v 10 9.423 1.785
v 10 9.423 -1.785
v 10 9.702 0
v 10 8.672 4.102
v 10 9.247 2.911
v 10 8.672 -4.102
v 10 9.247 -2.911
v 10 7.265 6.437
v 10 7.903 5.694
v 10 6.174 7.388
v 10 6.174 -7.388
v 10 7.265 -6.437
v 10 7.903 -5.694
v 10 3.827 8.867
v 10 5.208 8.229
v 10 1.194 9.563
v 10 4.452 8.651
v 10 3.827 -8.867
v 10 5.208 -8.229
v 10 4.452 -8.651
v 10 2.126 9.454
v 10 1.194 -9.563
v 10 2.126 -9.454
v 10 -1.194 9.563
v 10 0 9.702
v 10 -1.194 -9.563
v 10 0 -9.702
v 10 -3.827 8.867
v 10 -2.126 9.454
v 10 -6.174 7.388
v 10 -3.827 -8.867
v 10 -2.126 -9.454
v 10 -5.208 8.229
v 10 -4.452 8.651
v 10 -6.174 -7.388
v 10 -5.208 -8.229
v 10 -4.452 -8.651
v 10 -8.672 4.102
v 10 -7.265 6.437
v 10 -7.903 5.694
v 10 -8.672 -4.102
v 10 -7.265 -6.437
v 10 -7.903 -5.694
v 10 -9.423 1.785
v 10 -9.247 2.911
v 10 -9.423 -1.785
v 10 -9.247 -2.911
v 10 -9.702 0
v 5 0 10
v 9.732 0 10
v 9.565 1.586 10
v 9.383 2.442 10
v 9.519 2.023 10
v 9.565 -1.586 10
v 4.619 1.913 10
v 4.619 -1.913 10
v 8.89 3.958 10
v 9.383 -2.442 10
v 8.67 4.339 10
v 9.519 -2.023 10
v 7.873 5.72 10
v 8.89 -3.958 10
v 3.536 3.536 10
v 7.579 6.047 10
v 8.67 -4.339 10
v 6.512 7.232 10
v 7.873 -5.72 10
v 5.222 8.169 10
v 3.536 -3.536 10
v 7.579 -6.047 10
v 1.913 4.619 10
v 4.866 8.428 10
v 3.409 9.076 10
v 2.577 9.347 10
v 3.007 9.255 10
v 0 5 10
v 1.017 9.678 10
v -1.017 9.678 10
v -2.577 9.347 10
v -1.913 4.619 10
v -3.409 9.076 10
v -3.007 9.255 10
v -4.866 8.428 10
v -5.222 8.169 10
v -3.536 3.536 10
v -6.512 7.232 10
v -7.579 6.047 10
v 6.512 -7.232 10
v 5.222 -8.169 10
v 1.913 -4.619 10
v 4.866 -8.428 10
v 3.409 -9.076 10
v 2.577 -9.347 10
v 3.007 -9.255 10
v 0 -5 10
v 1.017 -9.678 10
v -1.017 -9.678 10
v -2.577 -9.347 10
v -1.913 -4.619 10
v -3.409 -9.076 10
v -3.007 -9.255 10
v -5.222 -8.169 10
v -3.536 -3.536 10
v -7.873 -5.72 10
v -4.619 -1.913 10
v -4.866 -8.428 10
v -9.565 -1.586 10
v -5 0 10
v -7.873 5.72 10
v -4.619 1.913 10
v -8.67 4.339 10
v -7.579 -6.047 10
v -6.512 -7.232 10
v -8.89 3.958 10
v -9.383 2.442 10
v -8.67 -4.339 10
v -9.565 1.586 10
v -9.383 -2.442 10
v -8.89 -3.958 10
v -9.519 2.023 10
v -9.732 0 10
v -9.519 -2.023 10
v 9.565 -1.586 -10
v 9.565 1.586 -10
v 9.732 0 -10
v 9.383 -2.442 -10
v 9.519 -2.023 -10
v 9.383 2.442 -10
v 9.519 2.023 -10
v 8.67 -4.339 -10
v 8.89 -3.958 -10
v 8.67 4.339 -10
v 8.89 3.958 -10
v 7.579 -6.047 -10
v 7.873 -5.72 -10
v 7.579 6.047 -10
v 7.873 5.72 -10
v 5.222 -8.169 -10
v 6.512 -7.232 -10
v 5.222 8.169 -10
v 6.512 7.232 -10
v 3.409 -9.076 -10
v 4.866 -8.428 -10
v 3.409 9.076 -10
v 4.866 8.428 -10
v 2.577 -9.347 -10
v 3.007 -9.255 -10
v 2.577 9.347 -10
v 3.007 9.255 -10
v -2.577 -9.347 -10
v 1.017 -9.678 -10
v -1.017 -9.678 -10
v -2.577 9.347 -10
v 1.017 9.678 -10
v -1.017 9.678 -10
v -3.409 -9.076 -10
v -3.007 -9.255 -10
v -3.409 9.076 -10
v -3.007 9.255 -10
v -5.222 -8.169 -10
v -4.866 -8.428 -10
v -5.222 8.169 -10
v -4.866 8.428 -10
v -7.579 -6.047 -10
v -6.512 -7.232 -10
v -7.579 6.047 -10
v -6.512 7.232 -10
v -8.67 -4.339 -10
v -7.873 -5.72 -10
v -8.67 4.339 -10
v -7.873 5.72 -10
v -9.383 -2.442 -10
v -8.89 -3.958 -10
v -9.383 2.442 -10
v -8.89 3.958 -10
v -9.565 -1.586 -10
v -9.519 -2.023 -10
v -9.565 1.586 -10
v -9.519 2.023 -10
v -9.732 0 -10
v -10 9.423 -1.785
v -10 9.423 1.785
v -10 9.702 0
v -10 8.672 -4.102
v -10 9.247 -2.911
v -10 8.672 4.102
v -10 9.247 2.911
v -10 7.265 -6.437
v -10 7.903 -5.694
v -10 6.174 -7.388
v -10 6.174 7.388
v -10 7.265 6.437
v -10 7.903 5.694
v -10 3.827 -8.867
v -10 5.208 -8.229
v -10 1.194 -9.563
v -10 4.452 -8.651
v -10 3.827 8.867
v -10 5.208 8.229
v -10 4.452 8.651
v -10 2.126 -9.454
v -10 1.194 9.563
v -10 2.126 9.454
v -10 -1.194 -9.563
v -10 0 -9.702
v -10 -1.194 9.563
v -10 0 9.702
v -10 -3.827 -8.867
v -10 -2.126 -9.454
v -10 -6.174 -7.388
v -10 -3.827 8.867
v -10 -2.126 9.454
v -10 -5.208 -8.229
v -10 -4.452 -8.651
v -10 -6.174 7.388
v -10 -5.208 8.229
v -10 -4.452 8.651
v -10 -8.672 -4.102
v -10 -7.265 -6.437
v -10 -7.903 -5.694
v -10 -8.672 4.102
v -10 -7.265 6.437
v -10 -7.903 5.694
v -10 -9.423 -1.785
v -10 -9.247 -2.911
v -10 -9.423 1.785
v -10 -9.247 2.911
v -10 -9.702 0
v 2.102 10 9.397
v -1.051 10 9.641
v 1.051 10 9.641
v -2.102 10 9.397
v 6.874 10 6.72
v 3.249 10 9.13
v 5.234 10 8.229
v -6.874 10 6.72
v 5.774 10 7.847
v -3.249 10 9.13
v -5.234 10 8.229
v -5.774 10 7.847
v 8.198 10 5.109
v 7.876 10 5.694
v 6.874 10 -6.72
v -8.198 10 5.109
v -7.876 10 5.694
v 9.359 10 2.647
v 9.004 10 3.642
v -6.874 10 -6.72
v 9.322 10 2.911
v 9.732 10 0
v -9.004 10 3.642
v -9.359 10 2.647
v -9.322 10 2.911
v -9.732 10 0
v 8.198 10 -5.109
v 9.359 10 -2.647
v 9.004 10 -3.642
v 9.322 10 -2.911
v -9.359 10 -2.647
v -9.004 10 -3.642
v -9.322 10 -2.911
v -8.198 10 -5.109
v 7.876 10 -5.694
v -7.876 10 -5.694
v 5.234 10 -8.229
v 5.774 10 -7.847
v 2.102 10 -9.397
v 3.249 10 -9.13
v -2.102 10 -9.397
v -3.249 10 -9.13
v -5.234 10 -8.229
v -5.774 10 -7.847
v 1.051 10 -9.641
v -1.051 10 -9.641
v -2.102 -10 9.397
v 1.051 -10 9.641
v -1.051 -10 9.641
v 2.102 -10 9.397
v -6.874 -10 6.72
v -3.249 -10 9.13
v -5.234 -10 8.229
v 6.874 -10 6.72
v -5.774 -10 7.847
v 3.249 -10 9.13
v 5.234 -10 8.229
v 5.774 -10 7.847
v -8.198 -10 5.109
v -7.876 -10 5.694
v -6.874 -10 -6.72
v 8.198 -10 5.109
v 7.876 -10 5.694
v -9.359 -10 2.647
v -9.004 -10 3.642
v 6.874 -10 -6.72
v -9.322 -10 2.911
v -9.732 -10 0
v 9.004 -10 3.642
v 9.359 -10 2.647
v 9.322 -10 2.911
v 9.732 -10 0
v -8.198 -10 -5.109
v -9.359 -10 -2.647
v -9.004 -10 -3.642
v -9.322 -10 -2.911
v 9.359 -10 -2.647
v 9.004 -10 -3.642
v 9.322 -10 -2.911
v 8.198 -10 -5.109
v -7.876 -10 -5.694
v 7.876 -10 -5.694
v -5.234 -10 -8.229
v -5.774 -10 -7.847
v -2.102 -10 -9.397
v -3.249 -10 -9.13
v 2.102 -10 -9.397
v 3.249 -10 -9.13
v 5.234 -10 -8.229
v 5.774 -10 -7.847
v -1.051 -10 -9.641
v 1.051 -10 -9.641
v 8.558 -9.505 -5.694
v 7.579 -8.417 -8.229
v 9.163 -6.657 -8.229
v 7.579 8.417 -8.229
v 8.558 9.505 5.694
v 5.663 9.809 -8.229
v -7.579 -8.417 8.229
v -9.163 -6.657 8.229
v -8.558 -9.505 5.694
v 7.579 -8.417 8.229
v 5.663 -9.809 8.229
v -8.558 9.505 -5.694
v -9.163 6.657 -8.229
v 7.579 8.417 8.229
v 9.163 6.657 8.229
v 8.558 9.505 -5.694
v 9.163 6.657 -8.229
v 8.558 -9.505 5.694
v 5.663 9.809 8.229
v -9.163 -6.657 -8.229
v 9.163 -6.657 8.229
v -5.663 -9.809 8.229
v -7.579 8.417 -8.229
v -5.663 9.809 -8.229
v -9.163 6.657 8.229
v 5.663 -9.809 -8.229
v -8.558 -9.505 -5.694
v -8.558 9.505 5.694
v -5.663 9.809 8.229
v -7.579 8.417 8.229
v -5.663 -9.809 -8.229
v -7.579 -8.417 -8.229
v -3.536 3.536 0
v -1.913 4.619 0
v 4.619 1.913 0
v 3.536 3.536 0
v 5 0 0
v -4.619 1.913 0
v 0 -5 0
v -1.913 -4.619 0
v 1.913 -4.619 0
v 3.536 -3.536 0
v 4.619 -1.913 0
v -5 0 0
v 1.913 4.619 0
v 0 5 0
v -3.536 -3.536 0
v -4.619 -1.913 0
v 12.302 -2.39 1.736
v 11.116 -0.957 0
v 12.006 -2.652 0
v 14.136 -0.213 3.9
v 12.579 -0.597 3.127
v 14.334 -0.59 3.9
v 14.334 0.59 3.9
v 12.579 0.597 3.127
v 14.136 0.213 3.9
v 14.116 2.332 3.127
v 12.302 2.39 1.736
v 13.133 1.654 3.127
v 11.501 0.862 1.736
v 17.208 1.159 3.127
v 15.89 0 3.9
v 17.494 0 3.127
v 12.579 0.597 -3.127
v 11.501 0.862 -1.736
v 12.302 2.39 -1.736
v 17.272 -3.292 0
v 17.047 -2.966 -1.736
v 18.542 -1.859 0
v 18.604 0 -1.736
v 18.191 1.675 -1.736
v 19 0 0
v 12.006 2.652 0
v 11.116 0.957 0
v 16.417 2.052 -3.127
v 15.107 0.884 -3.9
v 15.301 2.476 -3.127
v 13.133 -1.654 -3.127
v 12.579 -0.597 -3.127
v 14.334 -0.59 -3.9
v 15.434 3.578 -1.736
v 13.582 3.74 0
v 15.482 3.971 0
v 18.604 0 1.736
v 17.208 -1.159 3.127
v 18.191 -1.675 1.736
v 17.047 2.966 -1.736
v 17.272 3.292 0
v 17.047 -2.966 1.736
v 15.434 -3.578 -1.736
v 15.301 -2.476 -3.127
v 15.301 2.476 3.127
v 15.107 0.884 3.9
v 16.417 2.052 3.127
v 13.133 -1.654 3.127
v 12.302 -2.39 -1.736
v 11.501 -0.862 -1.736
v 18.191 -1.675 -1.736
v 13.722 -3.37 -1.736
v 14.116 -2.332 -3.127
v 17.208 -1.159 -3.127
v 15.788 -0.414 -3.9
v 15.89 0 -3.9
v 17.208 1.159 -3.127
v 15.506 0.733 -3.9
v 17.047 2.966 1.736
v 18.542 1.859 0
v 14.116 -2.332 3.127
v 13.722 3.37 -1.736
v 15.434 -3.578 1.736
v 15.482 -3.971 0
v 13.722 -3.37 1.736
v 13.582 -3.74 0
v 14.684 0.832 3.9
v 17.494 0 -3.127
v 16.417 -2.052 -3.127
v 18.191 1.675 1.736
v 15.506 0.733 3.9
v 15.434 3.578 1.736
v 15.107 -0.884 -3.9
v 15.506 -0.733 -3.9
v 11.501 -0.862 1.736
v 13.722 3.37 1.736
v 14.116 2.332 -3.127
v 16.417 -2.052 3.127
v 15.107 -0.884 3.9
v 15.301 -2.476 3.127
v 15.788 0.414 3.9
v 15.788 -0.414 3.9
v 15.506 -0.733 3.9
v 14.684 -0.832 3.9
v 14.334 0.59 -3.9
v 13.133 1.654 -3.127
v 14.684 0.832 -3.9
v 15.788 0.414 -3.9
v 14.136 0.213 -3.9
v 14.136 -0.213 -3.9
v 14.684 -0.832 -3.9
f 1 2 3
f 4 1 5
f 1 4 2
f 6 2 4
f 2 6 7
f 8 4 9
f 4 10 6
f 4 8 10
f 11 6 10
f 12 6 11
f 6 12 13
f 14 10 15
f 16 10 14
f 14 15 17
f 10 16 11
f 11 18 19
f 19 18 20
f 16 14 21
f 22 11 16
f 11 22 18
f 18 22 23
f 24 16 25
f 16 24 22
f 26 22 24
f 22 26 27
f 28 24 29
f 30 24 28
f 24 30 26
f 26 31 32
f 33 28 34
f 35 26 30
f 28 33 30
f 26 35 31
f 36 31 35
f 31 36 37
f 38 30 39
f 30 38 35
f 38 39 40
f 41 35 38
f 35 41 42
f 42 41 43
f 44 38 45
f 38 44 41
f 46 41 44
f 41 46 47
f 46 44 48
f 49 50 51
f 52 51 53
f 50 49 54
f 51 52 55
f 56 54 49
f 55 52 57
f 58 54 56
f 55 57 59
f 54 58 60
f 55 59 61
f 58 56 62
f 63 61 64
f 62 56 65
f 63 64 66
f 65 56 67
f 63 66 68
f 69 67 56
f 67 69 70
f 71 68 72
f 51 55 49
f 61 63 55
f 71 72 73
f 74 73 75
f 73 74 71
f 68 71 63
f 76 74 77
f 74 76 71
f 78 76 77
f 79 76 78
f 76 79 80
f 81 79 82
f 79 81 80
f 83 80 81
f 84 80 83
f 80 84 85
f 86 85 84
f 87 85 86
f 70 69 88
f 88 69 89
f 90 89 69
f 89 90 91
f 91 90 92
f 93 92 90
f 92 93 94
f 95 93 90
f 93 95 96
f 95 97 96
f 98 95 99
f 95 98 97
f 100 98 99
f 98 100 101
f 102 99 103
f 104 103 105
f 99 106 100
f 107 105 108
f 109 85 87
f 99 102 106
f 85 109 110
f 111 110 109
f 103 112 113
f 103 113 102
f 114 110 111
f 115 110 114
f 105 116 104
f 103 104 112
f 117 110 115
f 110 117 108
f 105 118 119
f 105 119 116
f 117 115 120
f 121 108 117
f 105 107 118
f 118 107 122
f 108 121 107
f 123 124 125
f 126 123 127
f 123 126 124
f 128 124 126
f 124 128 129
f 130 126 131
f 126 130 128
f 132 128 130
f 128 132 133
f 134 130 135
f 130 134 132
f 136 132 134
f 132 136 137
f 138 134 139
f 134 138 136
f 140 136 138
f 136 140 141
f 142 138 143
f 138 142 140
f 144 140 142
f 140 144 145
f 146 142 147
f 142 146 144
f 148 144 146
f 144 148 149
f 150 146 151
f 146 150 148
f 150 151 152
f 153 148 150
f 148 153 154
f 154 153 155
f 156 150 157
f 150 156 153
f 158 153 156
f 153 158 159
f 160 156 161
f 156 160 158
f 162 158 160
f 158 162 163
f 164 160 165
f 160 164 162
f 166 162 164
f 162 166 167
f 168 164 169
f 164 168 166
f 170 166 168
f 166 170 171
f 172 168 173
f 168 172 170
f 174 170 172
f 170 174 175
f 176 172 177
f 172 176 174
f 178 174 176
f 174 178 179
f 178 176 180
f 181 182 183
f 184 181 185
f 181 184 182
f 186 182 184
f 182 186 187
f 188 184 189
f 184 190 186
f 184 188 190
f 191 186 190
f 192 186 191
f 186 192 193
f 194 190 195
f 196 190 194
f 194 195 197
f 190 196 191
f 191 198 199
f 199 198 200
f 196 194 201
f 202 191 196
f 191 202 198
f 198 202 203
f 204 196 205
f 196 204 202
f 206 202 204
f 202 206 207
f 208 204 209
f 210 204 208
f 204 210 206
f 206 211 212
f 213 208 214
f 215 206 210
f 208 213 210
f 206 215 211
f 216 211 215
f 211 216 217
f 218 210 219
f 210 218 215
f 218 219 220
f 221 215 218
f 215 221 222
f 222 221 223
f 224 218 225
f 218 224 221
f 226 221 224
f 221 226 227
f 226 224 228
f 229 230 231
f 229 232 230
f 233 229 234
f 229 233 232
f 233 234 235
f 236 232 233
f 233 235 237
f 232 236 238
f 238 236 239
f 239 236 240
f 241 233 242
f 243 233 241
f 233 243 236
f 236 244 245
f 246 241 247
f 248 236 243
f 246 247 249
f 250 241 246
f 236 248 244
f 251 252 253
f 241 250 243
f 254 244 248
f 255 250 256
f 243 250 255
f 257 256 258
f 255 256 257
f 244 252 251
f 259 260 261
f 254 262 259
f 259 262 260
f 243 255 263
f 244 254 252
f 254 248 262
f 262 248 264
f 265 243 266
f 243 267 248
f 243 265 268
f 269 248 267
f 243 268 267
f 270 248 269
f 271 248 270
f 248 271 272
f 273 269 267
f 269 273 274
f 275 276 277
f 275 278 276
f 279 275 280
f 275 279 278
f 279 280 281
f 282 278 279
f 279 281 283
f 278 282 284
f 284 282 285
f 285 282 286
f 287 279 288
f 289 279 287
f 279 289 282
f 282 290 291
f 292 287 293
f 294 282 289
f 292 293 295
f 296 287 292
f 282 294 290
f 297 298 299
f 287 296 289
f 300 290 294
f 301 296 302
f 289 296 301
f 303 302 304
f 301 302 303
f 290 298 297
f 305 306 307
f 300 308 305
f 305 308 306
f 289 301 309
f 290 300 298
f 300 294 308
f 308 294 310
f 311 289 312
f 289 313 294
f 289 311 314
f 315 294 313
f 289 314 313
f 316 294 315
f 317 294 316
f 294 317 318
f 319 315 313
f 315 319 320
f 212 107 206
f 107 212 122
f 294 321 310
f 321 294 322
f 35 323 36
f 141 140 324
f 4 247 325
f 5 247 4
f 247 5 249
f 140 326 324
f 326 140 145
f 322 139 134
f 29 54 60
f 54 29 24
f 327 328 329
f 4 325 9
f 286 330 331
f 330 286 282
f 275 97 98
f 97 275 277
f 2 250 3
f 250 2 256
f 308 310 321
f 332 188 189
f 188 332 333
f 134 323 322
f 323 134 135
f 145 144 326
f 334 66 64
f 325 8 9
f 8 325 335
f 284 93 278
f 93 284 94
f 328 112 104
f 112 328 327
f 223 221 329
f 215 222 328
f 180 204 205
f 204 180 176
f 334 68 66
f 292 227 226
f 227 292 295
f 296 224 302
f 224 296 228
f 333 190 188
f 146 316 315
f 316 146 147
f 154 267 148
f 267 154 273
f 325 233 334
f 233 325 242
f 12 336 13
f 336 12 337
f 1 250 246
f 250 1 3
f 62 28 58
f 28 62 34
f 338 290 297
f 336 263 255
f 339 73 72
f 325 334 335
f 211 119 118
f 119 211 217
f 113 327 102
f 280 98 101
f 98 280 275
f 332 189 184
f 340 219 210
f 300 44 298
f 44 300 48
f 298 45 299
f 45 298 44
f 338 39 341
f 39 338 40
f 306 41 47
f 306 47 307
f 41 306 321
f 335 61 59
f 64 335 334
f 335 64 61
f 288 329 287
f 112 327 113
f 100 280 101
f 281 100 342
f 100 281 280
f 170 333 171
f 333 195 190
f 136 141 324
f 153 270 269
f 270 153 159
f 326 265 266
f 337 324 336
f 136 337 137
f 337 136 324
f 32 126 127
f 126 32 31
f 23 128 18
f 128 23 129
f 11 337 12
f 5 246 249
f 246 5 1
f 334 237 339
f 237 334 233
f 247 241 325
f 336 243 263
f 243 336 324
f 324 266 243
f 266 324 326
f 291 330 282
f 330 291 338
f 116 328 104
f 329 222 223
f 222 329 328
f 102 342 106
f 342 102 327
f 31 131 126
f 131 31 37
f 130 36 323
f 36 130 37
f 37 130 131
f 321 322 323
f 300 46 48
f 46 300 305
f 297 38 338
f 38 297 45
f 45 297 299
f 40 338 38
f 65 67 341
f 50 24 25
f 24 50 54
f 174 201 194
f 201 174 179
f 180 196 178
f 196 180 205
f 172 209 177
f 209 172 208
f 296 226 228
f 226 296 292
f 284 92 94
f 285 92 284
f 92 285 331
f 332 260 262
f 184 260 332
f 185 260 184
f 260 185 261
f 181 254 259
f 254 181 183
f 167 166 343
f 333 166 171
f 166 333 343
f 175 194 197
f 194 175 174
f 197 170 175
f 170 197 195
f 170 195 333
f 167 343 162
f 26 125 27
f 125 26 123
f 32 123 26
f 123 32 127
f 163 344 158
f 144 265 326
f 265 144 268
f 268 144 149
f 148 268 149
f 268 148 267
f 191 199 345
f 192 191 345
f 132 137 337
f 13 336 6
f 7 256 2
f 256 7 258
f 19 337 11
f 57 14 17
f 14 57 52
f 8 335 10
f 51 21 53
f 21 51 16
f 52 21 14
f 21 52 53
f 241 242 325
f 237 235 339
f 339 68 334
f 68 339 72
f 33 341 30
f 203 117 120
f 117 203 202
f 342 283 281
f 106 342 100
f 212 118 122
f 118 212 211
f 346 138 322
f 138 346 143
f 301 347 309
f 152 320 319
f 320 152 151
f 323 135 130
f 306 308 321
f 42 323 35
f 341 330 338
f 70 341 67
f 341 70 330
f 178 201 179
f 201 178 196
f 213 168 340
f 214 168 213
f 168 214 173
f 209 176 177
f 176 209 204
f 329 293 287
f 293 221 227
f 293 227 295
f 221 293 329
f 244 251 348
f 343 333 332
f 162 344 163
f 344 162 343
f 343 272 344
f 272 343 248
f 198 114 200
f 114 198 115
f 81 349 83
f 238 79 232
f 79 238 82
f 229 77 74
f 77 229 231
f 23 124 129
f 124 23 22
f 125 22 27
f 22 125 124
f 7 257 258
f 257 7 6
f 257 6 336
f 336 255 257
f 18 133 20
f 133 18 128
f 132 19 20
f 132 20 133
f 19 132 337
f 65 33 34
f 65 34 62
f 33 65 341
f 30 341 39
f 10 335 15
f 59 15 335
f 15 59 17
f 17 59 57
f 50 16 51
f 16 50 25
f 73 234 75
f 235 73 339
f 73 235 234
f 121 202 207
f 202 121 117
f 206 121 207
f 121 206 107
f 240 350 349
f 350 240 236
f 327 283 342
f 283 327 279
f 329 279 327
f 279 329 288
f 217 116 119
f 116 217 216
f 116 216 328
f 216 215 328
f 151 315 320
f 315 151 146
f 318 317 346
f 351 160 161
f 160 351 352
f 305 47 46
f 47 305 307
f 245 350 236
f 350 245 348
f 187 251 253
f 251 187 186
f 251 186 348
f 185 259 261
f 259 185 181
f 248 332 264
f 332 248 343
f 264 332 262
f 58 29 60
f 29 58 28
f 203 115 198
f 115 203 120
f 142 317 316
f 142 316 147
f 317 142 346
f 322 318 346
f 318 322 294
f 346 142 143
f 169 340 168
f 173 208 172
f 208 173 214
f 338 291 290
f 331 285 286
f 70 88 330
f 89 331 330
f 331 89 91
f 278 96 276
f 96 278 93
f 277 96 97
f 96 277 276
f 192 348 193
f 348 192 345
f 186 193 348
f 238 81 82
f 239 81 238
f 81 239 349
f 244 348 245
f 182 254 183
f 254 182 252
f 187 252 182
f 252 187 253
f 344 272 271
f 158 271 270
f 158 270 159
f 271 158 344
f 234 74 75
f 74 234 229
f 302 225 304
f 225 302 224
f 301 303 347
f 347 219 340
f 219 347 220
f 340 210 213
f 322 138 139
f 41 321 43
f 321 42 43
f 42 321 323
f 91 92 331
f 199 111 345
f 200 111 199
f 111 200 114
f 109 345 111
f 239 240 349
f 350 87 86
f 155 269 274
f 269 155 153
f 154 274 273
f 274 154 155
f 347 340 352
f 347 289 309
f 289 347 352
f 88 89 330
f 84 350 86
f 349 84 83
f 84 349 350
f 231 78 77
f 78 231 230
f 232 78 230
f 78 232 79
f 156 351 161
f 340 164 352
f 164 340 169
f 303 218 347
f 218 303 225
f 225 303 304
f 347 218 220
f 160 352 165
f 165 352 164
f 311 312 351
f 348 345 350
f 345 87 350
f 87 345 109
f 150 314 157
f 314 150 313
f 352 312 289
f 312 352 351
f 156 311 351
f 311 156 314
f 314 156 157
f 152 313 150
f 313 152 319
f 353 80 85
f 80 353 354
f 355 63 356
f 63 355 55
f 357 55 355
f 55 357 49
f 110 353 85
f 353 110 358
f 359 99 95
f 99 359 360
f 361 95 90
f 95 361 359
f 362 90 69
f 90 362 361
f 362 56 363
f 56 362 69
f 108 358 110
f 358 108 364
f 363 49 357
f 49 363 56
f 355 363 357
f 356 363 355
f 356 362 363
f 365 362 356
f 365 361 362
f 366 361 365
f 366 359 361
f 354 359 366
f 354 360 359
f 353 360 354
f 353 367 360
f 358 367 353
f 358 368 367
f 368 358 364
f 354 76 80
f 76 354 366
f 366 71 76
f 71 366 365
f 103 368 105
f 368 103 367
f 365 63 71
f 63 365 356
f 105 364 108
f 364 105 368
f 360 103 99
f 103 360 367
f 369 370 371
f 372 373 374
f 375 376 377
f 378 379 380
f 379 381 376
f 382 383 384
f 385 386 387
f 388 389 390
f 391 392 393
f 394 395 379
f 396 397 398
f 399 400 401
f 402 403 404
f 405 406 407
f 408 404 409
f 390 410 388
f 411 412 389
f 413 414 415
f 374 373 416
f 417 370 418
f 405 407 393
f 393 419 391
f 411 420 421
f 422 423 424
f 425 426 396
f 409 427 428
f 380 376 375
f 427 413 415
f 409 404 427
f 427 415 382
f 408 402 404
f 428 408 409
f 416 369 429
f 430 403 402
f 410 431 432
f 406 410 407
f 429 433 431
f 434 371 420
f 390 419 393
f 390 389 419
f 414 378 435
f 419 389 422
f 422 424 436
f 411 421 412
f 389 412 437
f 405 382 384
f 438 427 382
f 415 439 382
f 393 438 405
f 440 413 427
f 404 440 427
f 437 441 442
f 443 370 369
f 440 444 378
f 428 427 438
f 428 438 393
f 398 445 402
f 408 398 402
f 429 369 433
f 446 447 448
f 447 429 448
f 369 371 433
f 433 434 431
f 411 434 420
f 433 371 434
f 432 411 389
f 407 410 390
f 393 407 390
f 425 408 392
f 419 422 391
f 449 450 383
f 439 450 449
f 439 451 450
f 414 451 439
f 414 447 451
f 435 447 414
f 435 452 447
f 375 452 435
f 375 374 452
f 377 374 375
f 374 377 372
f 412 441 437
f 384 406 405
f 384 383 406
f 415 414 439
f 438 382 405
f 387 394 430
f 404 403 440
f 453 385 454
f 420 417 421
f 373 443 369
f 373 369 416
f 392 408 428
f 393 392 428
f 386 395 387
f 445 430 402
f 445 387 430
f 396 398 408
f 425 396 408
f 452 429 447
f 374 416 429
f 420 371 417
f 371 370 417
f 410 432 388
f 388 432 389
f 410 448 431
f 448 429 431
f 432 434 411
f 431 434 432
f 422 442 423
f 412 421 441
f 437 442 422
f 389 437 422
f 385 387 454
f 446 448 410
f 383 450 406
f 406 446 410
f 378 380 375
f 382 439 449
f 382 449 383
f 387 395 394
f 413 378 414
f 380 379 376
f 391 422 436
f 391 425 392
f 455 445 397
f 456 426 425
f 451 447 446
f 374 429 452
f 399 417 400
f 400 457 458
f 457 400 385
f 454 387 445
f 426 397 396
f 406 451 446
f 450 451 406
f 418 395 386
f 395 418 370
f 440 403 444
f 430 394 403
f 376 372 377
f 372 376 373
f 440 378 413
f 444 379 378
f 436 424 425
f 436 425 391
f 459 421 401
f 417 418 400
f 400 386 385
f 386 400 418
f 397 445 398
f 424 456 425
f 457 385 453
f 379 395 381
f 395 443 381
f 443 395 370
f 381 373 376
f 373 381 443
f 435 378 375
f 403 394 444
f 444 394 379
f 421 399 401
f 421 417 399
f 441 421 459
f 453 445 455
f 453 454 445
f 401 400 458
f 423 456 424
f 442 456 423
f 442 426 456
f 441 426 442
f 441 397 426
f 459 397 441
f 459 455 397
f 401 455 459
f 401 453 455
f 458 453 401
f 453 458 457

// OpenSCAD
union() {
    difference() {
        intersection() {
            cube([20, 20, 20], center = true);
            sphere(r = 14);
        }
        cylinder(h = 25, r = 5);
    }
    translate([15, 0, 0]) sphere(r = 4);
}
